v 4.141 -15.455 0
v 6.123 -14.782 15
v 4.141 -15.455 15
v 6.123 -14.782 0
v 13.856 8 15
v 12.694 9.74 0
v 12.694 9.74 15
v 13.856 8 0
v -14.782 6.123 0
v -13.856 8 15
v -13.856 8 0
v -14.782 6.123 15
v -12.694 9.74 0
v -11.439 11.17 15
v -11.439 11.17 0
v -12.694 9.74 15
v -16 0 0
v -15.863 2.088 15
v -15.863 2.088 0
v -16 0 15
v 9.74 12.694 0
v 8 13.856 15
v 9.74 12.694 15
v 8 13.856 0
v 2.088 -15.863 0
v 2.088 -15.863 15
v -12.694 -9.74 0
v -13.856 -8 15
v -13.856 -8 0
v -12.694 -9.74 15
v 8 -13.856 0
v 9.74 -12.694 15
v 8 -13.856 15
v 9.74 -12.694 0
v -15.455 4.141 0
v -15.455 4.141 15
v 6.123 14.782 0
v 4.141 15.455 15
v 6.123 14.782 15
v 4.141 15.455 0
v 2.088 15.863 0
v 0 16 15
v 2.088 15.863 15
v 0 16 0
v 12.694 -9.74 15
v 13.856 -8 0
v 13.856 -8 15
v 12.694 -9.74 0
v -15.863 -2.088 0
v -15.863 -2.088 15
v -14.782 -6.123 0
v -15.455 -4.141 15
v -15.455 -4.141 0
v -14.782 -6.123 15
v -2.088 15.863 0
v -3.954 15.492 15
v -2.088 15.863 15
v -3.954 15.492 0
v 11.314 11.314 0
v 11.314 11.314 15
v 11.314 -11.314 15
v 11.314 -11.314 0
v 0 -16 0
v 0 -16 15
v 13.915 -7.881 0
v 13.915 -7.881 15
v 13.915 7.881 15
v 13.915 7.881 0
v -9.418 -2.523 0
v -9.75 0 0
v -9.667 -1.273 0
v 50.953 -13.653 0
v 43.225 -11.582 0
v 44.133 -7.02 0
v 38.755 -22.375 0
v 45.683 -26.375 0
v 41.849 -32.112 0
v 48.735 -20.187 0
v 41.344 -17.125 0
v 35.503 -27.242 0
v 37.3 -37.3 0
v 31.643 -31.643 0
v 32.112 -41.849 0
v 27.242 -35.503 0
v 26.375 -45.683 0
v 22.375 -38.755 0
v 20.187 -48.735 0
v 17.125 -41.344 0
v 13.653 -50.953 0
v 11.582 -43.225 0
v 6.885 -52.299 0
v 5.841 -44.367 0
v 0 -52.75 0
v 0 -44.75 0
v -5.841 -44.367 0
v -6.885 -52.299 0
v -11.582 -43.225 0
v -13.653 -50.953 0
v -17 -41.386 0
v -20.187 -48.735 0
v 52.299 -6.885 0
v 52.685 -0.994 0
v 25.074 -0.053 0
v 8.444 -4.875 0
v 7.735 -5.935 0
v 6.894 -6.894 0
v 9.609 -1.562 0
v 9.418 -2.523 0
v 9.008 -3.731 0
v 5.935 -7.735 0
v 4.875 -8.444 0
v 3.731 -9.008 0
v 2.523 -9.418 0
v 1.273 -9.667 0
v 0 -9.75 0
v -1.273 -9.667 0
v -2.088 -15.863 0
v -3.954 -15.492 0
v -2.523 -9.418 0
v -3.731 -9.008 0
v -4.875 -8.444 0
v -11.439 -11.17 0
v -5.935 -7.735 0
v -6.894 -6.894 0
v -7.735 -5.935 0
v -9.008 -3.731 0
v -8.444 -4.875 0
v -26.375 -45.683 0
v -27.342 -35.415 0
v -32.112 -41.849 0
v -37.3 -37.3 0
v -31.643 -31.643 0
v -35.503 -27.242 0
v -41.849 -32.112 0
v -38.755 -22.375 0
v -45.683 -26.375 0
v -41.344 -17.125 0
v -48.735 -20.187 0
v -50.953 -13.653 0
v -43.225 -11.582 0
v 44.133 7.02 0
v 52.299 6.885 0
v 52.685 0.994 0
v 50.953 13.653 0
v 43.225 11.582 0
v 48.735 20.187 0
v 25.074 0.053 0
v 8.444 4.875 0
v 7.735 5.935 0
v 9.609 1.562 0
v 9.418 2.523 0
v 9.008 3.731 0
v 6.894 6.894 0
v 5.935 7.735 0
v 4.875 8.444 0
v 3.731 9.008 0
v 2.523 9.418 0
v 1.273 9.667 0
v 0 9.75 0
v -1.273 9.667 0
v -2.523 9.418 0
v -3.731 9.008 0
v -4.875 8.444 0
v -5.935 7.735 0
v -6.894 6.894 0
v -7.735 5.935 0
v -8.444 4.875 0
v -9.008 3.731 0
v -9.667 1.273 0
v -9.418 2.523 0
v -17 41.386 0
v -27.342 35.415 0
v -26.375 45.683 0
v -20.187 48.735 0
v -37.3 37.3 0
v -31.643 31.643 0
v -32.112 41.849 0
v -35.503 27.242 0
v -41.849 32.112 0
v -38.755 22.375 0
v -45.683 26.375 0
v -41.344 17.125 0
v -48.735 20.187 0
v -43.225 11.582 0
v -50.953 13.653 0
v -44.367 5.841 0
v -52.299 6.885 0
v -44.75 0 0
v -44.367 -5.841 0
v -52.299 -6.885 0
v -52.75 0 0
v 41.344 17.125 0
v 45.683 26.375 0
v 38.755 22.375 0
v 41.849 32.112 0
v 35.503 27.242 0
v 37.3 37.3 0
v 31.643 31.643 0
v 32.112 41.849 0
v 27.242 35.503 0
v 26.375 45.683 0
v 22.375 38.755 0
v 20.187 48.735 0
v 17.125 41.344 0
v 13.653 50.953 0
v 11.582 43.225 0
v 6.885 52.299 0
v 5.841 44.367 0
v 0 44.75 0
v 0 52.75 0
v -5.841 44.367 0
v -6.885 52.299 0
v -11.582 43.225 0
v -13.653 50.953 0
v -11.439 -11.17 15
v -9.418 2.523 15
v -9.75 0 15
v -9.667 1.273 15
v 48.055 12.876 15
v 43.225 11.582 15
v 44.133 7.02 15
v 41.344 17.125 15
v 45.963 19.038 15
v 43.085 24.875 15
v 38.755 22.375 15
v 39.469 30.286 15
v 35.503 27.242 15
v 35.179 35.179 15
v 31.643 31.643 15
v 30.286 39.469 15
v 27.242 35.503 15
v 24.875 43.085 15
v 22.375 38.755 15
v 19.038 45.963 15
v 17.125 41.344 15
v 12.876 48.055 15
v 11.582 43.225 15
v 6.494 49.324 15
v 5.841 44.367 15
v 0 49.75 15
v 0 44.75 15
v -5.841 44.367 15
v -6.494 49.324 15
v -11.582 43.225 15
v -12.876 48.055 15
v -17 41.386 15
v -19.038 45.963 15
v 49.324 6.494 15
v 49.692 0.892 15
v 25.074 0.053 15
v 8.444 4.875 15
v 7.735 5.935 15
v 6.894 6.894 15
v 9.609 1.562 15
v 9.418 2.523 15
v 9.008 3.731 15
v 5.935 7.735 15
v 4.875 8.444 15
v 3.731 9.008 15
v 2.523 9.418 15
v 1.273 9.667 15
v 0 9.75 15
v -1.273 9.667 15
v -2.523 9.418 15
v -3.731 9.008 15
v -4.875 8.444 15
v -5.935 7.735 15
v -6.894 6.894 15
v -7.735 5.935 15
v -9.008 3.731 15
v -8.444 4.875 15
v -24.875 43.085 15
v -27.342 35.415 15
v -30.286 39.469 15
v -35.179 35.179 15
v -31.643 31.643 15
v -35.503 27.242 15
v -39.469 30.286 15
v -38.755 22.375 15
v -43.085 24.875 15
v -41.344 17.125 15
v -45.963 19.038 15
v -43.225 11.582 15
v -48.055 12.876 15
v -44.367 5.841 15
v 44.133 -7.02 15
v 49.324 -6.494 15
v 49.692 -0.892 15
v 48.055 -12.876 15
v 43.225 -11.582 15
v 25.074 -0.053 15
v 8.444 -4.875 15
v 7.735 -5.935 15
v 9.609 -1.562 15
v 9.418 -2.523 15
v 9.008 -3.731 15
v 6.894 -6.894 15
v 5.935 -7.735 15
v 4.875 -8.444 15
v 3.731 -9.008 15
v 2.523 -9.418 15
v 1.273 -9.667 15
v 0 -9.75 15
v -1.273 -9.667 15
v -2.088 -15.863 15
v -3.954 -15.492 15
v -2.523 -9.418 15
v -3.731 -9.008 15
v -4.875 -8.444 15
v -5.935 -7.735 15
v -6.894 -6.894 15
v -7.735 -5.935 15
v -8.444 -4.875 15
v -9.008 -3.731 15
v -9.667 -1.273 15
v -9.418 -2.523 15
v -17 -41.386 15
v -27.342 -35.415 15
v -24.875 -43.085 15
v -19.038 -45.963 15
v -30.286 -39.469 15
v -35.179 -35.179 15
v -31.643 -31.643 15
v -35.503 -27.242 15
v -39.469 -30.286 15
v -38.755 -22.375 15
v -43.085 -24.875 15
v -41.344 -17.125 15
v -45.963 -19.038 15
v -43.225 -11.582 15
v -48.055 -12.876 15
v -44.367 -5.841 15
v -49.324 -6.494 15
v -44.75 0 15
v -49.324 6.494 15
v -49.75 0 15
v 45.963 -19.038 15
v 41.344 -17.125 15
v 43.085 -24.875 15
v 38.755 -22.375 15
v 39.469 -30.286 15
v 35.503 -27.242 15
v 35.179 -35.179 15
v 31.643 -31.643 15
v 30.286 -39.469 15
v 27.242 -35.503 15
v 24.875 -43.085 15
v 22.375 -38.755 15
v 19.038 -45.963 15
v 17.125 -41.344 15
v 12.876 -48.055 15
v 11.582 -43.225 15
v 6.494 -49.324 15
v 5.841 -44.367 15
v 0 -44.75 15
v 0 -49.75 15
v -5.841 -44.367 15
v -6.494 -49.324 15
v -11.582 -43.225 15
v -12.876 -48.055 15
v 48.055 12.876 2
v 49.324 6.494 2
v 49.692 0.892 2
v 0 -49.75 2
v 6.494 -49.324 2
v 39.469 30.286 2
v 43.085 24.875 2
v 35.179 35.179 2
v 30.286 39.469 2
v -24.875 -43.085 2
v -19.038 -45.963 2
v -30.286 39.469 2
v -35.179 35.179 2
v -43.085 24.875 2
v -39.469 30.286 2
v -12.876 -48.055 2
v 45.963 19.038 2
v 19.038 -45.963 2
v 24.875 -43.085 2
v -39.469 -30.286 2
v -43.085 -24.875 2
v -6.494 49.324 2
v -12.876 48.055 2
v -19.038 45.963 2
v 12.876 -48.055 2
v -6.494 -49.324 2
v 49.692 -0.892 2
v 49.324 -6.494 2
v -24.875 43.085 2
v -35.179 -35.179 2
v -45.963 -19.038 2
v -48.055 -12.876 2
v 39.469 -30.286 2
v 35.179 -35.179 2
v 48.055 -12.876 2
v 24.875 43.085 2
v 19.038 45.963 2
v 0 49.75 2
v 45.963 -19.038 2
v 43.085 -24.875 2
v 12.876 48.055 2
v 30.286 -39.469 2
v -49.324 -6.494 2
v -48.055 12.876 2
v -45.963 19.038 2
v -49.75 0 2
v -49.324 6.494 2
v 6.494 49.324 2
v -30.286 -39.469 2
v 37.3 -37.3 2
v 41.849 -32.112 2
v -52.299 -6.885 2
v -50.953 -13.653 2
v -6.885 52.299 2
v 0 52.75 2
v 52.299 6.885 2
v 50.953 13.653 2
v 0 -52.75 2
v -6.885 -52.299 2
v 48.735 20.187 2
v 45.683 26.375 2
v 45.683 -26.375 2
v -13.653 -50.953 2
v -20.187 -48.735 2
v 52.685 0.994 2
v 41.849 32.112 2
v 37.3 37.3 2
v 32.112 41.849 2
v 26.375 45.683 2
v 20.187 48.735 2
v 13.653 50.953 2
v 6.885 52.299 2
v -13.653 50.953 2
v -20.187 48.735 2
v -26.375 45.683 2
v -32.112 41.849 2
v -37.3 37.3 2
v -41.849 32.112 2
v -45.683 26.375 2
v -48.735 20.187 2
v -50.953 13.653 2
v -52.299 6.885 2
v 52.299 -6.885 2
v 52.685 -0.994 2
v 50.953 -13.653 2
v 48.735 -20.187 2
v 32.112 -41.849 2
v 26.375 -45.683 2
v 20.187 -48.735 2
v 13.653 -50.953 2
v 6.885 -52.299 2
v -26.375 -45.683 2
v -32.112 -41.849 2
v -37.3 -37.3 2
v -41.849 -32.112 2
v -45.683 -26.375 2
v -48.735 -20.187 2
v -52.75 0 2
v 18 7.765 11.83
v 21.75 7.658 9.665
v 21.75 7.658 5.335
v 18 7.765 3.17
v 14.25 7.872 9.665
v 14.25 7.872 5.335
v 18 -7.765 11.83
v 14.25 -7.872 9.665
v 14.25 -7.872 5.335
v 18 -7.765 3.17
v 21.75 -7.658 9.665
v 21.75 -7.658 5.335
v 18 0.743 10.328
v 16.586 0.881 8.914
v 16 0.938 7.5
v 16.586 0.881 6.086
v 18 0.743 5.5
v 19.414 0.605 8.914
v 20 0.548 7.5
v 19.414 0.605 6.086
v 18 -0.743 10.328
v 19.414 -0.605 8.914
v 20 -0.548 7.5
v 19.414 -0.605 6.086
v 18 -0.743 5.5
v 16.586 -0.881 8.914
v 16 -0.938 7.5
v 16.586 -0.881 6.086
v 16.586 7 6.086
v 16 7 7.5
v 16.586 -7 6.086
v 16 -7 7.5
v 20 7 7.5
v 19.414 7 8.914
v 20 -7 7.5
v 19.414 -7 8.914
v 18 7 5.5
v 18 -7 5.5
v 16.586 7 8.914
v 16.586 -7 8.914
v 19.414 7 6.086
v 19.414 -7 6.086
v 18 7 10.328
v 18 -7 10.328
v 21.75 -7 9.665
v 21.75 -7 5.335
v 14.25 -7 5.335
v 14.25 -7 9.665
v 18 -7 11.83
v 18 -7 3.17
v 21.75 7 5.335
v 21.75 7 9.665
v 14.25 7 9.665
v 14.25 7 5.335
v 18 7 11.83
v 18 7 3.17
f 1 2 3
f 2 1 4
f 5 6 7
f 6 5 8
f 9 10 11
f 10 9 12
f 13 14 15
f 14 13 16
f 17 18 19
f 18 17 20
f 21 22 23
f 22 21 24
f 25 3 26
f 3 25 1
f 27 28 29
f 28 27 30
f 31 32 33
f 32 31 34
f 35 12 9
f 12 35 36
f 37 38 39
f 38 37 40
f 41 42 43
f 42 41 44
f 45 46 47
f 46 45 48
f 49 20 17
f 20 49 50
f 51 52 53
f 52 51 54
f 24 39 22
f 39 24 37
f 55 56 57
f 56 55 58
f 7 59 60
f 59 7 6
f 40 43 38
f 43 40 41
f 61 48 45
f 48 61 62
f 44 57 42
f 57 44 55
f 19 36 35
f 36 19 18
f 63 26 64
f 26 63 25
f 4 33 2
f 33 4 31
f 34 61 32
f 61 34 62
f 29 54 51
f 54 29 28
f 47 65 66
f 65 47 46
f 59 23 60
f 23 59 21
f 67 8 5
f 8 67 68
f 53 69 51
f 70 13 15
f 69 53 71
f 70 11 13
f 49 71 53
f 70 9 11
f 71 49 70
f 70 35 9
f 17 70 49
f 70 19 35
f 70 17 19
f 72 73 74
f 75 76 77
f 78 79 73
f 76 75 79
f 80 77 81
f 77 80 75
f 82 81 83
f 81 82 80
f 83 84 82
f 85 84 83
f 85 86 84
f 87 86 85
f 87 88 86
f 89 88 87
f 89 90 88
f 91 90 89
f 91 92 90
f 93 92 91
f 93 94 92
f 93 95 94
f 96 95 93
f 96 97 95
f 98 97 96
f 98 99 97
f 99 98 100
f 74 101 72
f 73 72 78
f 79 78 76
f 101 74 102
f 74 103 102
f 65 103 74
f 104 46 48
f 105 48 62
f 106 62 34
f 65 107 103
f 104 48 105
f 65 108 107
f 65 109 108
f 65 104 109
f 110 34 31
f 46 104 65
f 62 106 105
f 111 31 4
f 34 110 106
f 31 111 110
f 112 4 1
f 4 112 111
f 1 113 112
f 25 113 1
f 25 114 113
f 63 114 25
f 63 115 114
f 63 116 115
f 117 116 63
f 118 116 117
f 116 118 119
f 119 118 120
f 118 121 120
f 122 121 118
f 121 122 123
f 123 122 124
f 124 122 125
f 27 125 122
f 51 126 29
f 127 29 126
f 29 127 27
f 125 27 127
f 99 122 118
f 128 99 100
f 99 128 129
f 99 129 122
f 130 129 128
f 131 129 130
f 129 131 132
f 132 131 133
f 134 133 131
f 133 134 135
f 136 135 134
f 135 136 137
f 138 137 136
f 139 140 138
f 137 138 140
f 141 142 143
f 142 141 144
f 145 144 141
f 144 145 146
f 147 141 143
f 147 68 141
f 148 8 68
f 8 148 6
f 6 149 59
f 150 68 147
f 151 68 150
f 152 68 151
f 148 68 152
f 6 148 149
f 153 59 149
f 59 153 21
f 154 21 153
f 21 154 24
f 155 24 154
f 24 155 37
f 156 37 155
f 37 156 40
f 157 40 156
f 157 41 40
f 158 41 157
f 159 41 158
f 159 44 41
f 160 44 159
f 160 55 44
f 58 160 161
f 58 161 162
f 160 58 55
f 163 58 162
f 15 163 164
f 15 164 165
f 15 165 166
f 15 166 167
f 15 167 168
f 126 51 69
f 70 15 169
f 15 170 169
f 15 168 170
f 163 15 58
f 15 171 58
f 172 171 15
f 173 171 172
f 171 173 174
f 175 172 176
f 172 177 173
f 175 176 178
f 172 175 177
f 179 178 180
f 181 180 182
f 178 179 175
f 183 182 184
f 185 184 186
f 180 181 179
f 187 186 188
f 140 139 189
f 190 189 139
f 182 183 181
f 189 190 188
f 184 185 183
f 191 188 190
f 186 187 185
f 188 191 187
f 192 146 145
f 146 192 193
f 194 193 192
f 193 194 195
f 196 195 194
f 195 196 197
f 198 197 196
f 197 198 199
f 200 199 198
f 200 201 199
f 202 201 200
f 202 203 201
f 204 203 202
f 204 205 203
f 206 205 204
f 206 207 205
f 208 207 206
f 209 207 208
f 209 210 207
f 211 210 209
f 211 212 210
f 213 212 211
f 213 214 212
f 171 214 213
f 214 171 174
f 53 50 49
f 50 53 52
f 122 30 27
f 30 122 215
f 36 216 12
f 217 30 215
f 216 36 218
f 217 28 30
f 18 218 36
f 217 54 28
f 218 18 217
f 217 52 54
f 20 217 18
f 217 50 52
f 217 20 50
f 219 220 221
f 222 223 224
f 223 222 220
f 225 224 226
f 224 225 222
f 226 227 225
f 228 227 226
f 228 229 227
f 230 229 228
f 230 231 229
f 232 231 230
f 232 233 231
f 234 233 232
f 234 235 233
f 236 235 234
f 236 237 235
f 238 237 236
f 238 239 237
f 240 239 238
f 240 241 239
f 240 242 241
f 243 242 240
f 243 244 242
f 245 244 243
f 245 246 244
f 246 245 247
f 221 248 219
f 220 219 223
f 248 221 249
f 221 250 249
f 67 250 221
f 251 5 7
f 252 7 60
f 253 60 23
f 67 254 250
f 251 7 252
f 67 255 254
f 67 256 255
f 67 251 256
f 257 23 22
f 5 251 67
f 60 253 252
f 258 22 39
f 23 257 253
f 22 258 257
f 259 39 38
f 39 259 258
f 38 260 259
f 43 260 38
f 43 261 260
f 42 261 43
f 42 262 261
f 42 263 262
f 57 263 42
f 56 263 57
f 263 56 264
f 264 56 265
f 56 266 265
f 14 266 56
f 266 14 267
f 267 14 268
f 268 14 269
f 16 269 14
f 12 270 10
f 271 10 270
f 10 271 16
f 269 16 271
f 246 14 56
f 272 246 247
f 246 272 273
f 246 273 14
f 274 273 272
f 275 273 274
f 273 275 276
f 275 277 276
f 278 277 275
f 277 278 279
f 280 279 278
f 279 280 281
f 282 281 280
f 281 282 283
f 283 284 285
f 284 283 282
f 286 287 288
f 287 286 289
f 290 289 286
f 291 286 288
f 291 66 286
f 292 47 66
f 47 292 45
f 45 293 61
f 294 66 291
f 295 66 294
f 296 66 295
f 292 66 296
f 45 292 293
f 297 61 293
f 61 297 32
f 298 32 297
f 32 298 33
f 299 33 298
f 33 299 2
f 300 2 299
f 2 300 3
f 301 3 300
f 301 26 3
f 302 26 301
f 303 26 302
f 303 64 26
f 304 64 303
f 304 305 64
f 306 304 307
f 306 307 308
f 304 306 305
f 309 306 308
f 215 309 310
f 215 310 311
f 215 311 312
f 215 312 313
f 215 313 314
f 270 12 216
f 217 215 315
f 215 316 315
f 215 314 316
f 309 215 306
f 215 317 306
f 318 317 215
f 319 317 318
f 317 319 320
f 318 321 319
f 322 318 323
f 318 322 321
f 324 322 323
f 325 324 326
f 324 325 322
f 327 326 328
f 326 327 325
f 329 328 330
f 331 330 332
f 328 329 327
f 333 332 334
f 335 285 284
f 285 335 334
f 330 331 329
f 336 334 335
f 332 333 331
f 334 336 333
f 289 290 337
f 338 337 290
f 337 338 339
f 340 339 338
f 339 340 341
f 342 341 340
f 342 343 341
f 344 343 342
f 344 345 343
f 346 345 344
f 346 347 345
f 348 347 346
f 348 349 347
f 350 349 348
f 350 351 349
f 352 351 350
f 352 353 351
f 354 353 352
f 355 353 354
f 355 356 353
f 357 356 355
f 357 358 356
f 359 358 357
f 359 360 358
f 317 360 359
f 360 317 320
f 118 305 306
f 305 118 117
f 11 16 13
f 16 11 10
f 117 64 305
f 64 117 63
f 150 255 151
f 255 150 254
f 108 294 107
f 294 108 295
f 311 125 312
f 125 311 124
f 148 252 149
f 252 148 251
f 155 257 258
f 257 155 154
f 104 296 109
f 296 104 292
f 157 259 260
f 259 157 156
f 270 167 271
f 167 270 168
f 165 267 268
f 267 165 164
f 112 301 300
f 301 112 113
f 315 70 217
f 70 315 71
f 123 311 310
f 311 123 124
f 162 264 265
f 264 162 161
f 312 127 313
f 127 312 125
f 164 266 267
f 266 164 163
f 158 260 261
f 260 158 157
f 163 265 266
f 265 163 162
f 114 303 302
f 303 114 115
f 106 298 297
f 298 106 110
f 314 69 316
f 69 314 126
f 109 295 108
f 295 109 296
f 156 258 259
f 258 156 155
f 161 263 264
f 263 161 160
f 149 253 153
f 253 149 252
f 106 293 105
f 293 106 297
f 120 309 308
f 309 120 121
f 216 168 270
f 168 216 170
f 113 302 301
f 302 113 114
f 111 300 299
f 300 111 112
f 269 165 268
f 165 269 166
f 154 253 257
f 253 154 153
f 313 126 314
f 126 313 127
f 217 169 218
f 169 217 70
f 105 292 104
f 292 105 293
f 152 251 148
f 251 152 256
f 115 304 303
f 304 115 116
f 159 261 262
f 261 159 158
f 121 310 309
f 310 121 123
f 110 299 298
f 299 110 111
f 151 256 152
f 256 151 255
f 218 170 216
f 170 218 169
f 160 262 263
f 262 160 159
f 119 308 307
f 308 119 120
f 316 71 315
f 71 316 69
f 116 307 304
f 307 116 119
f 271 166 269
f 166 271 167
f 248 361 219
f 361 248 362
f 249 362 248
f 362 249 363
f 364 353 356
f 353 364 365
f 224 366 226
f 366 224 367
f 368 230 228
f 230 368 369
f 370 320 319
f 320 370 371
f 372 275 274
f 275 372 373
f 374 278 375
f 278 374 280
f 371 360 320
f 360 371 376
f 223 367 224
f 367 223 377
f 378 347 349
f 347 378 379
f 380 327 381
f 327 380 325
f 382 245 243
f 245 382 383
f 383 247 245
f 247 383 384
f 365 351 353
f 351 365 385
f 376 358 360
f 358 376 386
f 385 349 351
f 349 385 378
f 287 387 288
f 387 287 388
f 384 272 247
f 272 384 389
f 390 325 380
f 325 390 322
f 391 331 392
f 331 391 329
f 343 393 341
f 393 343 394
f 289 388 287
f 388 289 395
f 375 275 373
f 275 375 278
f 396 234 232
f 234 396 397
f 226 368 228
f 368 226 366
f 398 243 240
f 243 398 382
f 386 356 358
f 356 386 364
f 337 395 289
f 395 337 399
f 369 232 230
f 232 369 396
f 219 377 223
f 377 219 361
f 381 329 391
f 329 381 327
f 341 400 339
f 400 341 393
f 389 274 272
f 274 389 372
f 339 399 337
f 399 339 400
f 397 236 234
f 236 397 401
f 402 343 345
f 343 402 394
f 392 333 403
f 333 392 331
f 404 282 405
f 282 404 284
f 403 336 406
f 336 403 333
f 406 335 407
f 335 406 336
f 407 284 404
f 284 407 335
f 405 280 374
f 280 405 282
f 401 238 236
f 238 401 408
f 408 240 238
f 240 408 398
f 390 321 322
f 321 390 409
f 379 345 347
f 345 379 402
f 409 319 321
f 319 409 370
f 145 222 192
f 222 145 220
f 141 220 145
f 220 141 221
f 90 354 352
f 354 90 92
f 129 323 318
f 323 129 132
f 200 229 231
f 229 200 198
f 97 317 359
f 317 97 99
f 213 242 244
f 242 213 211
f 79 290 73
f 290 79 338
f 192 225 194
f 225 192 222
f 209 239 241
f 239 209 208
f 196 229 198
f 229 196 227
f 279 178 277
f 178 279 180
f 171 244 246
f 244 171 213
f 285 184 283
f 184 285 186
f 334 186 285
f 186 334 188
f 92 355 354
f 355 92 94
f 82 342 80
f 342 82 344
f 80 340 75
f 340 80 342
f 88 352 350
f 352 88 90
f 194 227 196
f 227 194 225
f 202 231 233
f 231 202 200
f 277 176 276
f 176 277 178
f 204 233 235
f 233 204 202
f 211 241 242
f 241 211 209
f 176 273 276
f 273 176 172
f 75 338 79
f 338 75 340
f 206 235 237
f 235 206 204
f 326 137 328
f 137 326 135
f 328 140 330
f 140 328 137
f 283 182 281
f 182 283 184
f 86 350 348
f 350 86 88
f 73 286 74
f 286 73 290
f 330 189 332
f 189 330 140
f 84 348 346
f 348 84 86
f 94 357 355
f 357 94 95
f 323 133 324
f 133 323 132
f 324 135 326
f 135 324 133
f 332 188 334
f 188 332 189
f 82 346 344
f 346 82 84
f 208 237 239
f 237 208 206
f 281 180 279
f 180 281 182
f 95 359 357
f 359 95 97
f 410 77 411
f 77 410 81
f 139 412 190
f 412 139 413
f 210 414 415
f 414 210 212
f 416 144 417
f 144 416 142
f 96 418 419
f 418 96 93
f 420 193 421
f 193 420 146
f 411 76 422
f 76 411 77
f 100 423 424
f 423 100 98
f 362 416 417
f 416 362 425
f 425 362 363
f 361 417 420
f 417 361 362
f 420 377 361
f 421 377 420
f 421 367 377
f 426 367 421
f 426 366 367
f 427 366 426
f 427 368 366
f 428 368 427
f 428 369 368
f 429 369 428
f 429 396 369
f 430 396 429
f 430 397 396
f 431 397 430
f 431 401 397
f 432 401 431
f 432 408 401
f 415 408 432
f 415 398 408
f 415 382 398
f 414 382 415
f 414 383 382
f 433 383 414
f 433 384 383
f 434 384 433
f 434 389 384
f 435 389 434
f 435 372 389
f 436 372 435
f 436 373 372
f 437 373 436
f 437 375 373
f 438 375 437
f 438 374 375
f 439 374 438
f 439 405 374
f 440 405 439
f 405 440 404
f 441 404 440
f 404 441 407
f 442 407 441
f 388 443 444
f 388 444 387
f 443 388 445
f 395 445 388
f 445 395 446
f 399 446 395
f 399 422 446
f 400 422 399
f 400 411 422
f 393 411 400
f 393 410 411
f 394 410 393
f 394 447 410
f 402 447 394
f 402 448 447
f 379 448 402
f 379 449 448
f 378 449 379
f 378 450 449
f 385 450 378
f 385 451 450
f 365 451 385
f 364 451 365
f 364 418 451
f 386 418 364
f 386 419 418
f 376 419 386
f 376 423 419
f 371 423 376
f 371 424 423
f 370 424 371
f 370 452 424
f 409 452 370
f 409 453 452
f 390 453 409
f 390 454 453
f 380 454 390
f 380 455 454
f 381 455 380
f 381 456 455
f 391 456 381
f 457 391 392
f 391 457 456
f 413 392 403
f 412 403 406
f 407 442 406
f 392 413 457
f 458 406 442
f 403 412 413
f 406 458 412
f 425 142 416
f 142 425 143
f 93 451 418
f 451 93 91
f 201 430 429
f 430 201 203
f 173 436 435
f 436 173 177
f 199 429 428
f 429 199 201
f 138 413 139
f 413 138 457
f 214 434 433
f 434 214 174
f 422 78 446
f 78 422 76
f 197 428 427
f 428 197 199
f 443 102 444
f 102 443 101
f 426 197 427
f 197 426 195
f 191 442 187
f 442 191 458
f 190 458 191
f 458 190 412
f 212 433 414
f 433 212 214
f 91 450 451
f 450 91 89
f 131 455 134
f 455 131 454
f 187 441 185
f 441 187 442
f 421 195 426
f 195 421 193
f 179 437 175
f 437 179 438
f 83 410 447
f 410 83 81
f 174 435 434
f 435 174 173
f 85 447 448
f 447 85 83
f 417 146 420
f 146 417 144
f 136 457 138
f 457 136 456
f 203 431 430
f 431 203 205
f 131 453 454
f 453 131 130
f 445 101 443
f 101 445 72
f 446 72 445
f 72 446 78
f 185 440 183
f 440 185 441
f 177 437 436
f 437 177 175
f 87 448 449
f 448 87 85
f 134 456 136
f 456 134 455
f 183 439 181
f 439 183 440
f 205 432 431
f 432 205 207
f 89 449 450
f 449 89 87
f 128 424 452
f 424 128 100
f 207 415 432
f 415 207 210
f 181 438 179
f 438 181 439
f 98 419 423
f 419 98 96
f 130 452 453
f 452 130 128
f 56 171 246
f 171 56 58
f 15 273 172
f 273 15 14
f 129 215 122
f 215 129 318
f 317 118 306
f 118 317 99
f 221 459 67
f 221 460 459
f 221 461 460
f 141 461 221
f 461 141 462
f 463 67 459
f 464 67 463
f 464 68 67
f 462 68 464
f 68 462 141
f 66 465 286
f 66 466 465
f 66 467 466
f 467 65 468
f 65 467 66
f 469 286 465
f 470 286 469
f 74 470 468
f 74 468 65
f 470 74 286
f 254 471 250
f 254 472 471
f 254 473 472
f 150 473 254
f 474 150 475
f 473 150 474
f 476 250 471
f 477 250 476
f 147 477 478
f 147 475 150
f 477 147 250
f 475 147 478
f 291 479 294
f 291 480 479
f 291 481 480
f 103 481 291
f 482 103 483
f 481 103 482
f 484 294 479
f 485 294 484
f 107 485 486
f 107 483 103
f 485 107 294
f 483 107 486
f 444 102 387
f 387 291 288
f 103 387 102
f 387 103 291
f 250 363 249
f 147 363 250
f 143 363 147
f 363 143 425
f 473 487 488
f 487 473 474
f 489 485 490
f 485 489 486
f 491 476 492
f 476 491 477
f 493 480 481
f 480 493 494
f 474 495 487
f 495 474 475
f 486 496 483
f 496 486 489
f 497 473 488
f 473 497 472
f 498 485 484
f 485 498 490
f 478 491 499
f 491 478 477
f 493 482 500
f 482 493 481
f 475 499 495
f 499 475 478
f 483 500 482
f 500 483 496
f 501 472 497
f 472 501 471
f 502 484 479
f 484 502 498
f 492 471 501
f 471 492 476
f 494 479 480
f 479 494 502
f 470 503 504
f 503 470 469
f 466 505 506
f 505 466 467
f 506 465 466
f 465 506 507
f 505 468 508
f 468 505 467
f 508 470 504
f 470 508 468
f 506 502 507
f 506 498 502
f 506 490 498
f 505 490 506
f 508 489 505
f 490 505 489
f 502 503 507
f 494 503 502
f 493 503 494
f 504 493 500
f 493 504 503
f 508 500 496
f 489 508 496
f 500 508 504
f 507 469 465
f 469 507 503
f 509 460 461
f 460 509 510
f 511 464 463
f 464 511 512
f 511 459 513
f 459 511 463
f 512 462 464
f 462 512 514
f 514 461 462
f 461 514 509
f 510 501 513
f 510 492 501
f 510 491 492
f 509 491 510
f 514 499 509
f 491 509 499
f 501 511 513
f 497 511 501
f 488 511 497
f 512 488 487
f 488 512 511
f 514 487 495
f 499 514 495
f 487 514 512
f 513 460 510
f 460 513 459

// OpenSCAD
// Lampstand bracket

r1 = 19.5/2;   // Central hole
r2 = 32/2;     // Hub outer
r3 = 99.5/2-5; // Rim inner
r4 = r3+5;     // Rim outer
r5 = r4+3;     // Flange outer
r6 = 25+0;     // Clamp elbow

to = 15;  // Thickness overall
tf = 2;   // Tickness flange
d  = 0.1; // delta

module tube(r1, r2, t)
{
  difference()
  {
    cylinder(r=r2, h=t, $fn=48);
    translate([0,0,-d/2])
      cylinder(r=r1, h=t+d, $fn=48);
  }
}

module spoke(ri, ro, t, wh, wr, a)
{
  rotate([0,0,a])
  {
    linear_extrude(height=t, twist=0)
    {
      polygon([[ri,-wh/2],
               [ri, wh/2],
               [ro, wr/2],
               [ro,-wr/2],
               [ri,-wh/2]]);
    }
  }
}

module teardropY(x, y1, y2, z, r)
{
  h = y2-y1;
  translate([x,y2,z])
  {
    rotate([90,0,0])
    {
      cylinder(r=r,h=h, $fn=8);
      rotate([0,0,45])
        cube(size=[r, r, h]) ;
    }
  }
}

// Vertical nut recess with base of nut 
// centred on origin 
//
// af = nut size accross faces
// oh = overall height of recess
module nutrecessZ(oh, af)
{
  sin60 = sin(60);
  rotate([0,0,90])
  {
    cylinder(r=af/sin60/2, h=oh, $fn=6);
  }
}

module nutrecessY(x, y1, y2, z, af)
{
  translate([x,y2,z])
    rotate([90,0,0])
      nutrecessZ(y2-y1, af);
}

module splitspoke(cti, cto, a)
{
  rotate([0,0,a])
  {
    translate([0,0,-d/2])
    {
      spoke(0,  r6+d, to+d, 5,   0.1, 0); 
      spoke(r6, r5+d, to+d, 0.1, 2,   0); 
    }
    teardropY(r2+2,  -cto,  cto, to/2, 2);
    nutrecessY(r2+2, -cto, -cti, to/2, 7.5);
    nutrecessY(r2+2,  cti,  cto, to/2, 7.5);
  }
}

module bracket3()
{
  difference()
  {
    union()
    {
      tube(r1, r2, to);          // Hub
      tube(r3, r4, to);          // Rim
      tube(r3, r5, tf);          // Flange
      spoke(r1, r3+d, to,  8, 12, 120);
      spoke(r1, r3+d, to,  8, 12, 240);
      spoke(r1, r3+d, to, 16, 14, 0);
    }
    splitspoke(7, 9, 0); 
  }
}

module bracket4()
{
  difference()
  {
    union()
    {
      tube(r1, r2, to);  // Hub
      tube(r3, r4, to);  // Rim
      tube(r3, r5, tf);  // Flange
      spoke(r1, r3+d, to,  8, 12,  90);
      spoke(r1, r3+d, to,  8, 12, 270);
      spoke(r1, r3+d, to, 16, 14,   0);
      spoke(r1, r3+d, to, 16, 14, 180);
    }
    splitspoke(7, 9,   0); 
    splitspoke(7, 9, 180); 
  }
}

module bracket2()
{
  difference()
  {
    union()
    {
      tube(r1, r2, to);  // Hub
      tube(r3, r4, to);  // Rim
      tube(r3, r5, tf);  // Flange
      spoke(r1, r3+d, to,  8, 12,  90);
      spoke(r1, r3+d, to, 16, 14,   0);
      spoke(r1, r3+d, to, 16, 14, 180);
    }
    translate([-(r5+d),-(r5+d),-d/2])
      cube(size=[(r5+d)*2,r5+d,to+d]);
    splitspoke(7, 9,   0); 
    splitspoke(7, 9, 180); 
  }
}

// translate([0,5,0]) bracket2();
// translate([0,-5,0]) rotate([0,0,180]) bracket2();

bracket3();
